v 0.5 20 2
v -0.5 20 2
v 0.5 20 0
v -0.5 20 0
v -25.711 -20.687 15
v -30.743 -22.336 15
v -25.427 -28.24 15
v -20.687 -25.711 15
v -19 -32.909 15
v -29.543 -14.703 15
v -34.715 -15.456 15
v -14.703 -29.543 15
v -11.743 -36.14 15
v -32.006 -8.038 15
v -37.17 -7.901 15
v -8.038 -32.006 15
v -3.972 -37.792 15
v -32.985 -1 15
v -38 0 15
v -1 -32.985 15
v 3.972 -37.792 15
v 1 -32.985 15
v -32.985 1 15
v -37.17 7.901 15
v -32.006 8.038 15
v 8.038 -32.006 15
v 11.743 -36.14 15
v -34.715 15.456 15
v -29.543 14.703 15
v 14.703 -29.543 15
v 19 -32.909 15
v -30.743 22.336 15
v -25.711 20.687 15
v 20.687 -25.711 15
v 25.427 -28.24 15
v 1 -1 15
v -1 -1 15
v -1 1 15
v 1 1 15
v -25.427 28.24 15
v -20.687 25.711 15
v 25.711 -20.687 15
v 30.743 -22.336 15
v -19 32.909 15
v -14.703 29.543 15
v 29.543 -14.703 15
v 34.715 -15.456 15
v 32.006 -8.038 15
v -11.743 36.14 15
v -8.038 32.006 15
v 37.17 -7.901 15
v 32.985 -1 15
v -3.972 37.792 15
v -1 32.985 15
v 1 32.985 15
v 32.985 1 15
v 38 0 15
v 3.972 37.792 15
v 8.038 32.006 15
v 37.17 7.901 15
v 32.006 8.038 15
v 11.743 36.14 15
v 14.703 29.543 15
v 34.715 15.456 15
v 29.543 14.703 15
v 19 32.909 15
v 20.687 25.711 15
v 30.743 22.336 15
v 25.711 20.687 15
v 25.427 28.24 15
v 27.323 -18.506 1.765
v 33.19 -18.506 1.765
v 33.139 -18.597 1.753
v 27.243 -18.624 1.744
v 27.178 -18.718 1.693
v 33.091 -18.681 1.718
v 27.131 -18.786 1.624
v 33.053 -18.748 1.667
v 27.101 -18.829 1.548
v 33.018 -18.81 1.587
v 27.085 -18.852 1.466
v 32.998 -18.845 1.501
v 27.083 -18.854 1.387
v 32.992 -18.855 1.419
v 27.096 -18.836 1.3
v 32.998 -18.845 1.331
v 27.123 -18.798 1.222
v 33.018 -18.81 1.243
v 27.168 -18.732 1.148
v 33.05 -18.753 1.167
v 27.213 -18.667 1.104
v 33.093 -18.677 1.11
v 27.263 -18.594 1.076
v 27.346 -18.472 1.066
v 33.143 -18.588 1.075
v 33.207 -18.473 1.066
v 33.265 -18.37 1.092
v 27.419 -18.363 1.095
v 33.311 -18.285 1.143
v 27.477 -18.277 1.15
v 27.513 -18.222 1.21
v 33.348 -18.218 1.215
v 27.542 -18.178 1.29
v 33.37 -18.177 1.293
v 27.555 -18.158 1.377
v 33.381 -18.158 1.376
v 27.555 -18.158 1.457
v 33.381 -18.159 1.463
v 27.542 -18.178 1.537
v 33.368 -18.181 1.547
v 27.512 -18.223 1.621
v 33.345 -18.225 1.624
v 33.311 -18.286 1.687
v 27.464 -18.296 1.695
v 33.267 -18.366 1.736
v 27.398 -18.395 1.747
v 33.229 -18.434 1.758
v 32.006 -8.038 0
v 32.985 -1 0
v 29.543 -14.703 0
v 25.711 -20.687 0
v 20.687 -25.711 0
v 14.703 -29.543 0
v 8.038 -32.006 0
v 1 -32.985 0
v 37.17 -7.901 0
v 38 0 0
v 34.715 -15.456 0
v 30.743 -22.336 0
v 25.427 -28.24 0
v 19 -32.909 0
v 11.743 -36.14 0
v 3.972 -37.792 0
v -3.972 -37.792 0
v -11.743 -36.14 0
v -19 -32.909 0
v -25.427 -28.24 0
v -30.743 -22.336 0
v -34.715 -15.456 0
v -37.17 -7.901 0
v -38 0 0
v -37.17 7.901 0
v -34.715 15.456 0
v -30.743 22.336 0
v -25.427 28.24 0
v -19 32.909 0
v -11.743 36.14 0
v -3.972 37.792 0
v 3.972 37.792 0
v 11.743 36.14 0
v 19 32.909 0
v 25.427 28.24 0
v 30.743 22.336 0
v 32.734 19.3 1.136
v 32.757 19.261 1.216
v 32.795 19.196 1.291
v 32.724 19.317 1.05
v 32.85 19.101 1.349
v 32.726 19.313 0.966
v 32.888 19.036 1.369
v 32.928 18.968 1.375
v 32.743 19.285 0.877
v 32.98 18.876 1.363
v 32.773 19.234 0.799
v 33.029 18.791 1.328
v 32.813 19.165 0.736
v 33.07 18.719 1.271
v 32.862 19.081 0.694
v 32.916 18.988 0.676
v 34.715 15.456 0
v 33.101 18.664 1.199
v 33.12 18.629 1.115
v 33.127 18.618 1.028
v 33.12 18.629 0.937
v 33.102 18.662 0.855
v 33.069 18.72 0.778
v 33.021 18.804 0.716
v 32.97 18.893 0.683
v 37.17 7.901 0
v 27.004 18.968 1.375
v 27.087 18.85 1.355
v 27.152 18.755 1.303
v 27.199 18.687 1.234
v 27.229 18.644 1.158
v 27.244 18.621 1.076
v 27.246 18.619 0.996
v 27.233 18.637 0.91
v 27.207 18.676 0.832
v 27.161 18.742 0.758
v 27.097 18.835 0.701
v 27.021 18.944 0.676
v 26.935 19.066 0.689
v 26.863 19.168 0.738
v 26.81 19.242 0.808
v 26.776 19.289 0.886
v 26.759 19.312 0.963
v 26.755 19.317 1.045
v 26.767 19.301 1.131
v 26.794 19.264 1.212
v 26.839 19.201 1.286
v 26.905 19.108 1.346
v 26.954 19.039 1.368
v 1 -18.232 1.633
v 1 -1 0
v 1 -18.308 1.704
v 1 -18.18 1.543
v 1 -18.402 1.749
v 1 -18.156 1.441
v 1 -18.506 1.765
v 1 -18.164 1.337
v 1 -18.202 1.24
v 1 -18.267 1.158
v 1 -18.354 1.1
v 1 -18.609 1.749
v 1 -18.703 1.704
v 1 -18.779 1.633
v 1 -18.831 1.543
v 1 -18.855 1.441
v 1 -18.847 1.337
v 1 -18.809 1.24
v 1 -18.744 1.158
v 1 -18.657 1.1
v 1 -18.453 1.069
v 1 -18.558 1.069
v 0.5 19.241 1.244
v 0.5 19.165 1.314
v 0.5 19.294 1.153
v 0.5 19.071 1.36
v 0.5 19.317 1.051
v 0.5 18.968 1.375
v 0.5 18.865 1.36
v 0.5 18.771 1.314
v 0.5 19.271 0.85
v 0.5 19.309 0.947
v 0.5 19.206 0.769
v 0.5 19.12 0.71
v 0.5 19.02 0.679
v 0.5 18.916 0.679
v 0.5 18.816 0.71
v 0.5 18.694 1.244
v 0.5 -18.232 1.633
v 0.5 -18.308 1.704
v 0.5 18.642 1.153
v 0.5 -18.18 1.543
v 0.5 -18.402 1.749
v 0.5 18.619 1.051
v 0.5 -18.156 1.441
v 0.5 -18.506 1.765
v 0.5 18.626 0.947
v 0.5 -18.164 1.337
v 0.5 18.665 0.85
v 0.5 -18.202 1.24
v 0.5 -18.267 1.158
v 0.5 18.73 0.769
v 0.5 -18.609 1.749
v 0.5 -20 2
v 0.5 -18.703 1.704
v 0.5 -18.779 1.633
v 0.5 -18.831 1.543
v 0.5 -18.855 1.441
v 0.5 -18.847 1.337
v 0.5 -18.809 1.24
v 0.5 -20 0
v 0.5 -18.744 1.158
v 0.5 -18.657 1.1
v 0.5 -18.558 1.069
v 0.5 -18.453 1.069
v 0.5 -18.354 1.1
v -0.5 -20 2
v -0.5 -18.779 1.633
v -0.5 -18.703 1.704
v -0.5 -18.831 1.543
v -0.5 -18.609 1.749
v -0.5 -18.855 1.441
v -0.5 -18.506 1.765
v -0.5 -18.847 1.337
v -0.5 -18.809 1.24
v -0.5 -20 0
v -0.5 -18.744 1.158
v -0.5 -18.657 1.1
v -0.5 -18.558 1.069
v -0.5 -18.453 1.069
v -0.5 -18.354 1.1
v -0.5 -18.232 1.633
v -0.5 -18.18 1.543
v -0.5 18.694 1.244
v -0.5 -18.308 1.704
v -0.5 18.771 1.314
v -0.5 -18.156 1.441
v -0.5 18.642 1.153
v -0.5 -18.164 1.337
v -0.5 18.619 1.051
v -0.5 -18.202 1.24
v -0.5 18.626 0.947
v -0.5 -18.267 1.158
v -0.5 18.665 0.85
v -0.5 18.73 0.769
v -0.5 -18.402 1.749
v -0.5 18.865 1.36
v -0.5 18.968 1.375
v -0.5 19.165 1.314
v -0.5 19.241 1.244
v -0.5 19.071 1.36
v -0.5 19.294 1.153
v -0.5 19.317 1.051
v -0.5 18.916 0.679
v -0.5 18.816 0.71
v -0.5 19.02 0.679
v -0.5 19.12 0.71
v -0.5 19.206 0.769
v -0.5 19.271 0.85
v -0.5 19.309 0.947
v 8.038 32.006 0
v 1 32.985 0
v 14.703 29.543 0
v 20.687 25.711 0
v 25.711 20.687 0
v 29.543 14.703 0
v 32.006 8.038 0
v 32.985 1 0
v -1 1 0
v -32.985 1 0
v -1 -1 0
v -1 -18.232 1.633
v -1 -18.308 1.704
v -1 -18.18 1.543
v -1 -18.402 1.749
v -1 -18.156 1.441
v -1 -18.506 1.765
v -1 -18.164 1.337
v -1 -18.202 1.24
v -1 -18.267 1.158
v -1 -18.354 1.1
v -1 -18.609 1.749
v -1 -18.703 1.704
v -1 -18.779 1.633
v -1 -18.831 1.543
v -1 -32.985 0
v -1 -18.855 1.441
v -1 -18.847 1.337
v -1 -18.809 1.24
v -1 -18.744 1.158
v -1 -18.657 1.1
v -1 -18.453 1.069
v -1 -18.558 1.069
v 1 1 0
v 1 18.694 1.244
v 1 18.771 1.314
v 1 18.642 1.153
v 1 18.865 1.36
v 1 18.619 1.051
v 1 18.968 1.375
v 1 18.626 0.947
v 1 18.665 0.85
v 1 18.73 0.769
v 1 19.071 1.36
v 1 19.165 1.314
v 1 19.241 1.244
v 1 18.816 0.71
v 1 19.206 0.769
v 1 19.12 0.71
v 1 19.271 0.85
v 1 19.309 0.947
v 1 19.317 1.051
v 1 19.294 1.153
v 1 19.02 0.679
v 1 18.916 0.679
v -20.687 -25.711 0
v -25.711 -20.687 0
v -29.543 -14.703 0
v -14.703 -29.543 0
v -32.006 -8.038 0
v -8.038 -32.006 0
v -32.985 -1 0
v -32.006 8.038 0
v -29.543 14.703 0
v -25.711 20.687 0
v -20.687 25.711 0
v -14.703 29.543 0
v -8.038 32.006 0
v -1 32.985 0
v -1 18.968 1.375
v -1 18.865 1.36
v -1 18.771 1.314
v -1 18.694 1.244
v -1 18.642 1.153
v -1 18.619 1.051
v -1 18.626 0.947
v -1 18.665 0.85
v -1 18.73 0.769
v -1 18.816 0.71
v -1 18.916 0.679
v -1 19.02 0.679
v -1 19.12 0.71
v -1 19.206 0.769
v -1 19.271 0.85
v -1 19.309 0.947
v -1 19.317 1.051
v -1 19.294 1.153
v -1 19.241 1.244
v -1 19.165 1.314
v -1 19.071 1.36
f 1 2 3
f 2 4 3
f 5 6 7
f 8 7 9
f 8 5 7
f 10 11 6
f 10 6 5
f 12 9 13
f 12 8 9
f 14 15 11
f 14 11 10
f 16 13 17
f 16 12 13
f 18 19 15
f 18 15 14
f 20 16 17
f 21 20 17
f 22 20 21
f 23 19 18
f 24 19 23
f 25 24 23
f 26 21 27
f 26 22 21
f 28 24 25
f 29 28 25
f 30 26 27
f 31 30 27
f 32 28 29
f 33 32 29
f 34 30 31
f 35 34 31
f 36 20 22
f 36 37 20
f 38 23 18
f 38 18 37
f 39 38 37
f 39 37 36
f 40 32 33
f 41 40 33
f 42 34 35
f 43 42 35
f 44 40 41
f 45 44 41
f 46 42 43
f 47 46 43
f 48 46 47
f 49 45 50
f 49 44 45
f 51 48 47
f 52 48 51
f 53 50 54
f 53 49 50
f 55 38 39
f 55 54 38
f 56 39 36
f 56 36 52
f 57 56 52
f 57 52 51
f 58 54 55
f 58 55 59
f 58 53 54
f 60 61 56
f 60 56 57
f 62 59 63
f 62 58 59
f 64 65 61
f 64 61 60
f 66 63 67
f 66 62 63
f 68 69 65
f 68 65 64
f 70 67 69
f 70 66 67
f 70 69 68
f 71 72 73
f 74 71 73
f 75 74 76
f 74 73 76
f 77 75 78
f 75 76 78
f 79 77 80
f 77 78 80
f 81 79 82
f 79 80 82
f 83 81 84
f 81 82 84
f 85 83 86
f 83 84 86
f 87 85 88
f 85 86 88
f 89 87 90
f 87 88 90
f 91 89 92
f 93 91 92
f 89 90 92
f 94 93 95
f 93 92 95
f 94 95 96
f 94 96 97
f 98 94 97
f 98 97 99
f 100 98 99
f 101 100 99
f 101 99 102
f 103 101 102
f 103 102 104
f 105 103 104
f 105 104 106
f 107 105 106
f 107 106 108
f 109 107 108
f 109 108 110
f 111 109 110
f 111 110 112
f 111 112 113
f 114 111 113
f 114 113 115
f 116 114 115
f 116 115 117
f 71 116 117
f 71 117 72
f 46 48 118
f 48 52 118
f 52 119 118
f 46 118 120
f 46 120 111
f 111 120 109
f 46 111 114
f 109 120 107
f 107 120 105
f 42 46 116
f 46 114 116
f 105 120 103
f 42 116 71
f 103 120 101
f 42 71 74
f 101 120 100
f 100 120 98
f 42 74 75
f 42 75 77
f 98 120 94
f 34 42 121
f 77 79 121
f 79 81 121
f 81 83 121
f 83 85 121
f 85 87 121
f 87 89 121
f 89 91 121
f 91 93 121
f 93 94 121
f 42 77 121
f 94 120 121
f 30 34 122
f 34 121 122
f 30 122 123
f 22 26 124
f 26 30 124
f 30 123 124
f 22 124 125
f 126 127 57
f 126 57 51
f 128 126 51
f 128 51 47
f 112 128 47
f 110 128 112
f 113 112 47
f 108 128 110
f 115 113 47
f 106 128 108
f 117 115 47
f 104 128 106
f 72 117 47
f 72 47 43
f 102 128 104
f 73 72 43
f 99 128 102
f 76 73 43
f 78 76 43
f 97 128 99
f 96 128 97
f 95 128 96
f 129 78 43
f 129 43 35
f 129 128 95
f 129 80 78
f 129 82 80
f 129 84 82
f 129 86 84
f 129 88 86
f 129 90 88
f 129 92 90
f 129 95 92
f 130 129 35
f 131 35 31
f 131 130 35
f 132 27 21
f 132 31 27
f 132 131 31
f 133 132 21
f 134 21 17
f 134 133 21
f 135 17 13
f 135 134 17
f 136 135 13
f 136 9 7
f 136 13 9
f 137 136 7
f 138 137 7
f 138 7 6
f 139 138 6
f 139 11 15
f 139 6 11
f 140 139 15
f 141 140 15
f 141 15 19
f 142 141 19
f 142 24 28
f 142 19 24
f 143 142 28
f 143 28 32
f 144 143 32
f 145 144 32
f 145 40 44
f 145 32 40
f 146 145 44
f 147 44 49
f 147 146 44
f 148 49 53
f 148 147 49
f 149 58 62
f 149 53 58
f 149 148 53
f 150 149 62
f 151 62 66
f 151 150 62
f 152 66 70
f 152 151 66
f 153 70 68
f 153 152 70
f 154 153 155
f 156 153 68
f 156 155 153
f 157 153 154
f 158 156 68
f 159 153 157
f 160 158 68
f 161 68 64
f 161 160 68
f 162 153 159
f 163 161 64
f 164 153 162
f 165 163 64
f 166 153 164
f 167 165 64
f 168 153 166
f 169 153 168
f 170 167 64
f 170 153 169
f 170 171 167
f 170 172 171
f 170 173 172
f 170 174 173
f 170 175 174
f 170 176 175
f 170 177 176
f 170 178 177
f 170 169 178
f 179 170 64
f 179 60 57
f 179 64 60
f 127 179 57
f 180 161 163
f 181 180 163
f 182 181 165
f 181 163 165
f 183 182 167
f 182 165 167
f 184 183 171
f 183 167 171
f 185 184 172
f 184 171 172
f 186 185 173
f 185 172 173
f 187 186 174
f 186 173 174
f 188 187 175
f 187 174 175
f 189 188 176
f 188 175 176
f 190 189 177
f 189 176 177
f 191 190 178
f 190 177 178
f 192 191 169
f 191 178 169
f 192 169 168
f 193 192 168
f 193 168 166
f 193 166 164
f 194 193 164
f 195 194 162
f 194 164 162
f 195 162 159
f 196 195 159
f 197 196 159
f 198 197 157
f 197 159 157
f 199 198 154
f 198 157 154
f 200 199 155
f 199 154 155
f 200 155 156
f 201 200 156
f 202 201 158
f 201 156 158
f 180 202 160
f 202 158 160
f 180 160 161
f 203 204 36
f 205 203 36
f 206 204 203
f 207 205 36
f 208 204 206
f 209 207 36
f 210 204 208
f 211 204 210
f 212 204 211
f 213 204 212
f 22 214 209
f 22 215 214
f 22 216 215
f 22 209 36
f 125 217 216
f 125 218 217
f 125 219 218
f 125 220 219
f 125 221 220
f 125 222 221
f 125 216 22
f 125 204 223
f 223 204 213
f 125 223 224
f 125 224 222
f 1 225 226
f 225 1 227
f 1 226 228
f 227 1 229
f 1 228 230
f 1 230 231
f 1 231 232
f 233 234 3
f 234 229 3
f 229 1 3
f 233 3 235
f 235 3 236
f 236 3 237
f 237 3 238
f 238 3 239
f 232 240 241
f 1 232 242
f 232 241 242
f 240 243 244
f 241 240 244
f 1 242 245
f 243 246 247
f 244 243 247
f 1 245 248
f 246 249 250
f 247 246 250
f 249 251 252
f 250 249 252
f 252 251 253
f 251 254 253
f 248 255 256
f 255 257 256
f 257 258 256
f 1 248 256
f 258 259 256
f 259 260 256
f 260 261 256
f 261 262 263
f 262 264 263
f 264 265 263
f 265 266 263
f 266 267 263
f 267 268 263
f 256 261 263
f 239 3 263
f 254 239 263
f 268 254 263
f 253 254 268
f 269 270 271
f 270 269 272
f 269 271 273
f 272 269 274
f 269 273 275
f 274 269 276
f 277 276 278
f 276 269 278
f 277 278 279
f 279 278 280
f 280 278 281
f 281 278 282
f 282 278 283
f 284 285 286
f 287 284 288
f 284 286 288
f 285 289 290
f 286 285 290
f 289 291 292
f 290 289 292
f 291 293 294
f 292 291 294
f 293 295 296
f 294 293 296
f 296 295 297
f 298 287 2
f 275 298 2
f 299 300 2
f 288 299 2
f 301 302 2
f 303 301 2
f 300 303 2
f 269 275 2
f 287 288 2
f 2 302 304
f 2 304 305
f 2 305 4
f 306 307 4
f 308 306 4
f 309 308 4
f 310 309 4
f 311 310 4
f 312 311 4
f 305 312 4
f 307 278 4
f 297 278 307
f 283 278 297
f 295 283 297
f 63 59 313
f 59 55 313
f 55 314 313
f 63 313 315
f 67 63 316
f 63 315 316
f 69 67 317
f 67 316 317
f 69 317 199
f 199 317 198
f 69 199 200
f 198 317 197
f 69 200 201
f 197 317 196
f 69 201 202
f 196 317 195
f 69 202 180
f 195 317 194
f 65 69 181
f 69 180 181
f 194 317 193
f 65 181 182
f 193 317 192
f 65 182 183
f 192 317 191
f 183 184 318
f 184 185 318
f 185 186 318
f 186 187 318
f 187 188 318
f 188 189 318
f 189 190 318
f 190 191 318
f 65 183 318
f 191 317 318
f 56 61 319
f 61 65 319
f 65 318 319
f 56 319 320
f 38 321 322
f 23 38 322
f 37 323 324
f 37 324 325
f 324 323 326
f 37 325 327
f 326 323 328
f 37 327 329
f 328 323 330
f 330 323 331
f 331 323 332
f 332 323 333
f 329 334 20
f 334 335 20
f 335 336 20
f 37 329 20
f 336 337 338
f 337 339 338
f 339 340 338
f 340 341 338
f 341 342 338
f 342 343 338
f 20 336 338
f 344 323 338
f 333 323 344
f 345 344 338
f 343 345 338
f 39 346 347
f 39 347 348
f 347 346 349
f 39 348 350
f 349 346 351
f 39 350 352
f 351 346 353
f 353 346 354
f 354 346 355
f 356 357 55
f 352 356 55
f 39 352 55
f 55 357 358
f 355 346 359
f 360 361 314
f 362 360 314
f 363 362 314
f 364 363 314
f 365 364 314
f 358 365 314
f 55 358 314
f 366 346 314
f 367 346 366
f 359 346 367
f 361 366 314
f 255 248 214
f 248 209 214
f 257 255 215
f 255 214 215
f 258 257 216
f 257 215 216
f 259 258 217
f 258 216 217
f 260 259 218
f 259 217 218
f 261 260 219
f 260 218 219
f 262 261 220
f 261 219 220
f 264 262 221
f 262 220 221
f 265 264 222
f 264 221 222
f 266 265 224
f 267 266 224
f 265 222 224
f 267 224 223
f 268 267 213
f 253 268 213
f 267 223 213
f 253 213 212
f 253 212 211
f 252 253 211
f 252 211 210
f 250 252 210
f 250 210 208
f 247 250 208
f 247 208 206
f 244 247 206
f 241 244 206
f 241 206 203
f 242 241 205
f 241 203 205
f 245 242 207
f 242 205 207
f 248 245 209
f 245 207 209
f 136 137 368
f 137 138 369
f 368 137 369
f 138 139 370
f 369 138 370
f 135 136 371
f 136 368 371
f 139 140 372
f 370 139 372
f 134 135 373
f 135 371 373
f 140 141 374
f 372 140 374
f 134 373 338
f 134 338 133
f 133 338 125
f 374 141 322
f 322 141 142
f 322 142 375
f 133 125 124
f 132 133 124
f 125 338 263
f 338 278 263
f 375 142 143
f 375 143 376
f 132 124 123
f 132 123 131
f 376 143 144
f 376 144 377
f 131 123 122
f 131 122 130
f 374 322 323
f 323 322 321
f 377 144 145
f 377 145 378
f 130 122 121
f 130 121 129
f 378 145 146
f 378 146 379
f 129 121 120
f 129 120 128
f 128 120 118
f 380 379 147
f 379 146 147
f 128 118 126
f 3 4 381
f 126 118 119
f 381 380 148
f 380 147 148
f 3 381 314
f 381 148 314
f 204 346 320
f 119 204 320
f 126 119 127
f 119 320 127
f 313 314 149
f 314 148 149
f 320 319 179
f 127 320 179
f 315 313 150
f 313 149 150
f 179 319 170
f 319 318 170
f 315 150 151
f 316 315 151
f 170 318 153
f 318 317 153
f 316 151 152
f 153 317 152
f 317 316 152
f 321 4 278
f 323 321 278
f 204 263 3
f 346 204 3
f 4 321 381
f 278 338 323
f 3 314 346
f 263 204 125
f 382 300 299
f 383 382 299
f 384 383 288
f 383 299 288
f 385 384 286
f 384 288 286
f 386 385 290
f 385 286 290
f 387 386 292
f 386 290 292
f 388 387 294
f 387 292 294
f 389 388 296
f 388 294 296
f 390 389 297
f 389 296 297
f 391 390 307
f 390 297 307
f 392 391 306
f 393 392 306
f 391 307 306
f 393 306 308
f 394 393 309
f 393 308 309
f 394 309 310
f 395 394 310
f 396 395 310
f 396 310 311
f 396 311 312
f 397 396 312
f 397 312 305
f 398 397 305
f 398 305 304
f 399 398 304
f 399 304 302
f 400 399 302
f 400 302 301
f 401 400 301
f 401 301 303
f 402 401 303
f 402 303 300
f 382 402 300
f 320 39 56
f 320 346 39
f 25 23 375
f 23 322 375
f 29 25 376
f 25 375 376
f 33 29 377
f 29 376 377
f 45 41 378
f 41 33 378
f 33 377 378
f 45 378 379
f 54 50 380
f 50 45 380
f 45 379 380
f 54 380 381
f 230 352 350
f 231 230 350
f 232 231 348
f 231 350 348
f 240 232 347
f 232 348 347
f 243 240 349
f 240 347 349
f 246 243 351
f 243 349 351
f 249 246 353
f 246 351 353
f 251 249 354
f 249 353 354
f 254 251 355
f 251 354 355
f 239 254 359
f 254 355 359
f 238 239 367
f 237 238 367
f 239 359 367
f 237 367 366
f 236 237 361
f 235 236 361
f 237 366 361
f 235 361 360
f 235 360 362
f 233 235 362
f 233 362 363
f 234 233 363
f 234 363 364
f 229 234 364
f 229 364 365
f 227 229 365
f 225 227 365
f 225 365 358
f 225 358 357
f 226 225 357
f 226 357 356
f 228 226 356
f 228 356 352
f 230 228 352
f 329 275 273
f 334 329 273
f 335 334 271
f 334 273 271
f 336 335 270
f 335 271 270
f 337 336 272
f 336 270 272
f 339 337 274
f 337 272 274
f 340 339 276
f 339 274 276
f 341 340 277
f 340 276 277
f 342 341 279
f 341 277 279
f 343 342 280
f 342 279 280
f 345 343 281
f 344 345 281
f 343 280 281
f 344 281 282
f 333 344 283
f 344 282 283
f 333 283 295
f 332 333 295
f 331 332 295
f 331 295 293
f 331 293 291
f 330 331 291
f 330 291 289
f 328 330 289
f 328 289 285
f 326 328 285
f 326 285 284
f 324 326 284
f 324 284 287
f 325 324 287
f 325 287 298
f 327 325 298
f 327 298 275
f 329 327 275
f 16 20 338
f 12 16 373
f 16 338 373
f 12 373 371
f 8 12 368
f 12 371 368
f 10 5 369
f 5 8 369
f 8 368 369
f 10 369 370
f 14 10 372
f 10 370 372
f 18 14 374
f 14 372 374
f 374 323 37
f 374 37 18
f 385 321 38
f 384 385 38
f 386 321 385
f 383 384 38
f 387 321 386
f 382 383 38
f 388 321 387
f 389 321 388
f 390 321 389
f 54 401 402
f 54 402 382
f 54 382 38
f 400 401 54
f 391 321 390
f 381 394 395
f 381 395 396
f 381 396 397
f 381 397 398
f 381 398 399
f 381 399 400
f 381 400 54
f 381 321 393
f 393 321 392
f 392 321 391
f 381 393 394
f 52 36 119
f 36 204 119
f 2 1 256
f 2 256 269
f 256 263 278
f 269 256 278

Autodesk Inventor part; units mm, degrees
ref_plane "YZ Plane" through (0, 0, 0) normal (1, 0, 0) x (0, 1, 0)
ref_plane "XZ Plane" through (0, 0, 0) normal (0, 1, 0) x (-1, 0, 0)
ref_plane "XY Plane" through (0, 0, 0) normal (0, 0, 1) x (1, 0, 0)
sketch "Sketch1" plane through (0, 0, 0) normal (0, 0, 1) x (1, 0, 0)
  circle A0 centre (0, 0) radius 38
  circle A1 centre (0, 0) radius 33
  dimension "d0" = 76
  dimension "d1" = 66
extrude "Extrusion1" add sketch "Sketch1" along normal blind 15
sketch "Sketch2" plane through (0, 0, 0) normal (0, 0, -1) x (-1, 0, 0)
  circle A0 centre (0, 0) radius 33 projected
  line L0 (0.0152, 1) -> (-32.9848, 1)
  line L1 (0.0152, -1) -> (-32.9848, -1)
  line L2 (0.0152, 1) -> (-12.0152, 1)
  circle A1 centre (0, 0) radius 33
  line L3 (0.0152, -1) -> (0.0152, 1)
  line L4 (-1, 0.0152) -> (-1, -32.9848)
  line L5 (1, 0.0152) -> (1, -32.9848)
  line L6 (-0.0152, -1) -> (32.9848, -1)
  line L7 (-0.0152, 1) -> (32.9848, 1)
  line L8 (1, -0.0152) -> (1, 32.9848)
  line L9 (-1, -0.0152) -> (-1, 32.9848)
  point P0 (-1, 1)
  point P1 (-1, -1)
  point P2 (1, -1)
  point P3 (1, 1)
  dimension "d12" = 2
  dimension "d17" = 66
  dimension "d18" = 33
  dimension "d19" = 33
  dimension "d22" = 360
extrude "Extrusion2" add sketch "Sketch2" against normal blind 15 contours A0 L6 L5 L8 L7 | L8 L7 L0 L9 A0 | L8 L5 L6 L3 L7 | A0 L4 L1 L6 L5 | L3 L1 L4 L9 L0 | L0 L9 L4 L1 A0
sketch "Sketch3" plane through (0, 0, 0) normal (0, 0, -1) x (-1, 0, 0)
  line L0 (0, 20) -> (-0.5, 20)
  line L1 (-0.5, 20) -> (-0.5, -20)
  line L2 (-0.5, -20) -> (0.5, -20)
  line L3 (0.5, -20) -> (0.5, 20)
  line L4 (0.5, 20) -> (0, 20)
  point P0 (0, 0)
  dimension "d27" = 20
  dimension "d29" = 40
  dimension "d30" = 1
  dimension "d31" = 40
extrude "Extrusion3" cut sketch "Sketch3" against normal blind 2
sketch "Sketch4" plane through (-1, 1, 0) normal (-1, 0, 0) x (0, 0, 1)
  point P0 (0, -1)
  point P1 (1.0253, 17.9677)
hole "Hole1" at (-1, 18.9677, 1.0253) direction (1, 0, 0) diameter 0.7 end through all
sketch "Sketch5" plane through (-1, -32.9848, 0) normal (-1, 0, 0) x (0, 0, 1)
  point P0 (0, 32.9848)
  point P1 (1.4149, 14.4794)
hole "Hole2" at (-1, -18.5055, 1.4149) direction (1, 0, 0) diameter 0.7 end through all
properties part number "SUJETADOR_MICRO"
